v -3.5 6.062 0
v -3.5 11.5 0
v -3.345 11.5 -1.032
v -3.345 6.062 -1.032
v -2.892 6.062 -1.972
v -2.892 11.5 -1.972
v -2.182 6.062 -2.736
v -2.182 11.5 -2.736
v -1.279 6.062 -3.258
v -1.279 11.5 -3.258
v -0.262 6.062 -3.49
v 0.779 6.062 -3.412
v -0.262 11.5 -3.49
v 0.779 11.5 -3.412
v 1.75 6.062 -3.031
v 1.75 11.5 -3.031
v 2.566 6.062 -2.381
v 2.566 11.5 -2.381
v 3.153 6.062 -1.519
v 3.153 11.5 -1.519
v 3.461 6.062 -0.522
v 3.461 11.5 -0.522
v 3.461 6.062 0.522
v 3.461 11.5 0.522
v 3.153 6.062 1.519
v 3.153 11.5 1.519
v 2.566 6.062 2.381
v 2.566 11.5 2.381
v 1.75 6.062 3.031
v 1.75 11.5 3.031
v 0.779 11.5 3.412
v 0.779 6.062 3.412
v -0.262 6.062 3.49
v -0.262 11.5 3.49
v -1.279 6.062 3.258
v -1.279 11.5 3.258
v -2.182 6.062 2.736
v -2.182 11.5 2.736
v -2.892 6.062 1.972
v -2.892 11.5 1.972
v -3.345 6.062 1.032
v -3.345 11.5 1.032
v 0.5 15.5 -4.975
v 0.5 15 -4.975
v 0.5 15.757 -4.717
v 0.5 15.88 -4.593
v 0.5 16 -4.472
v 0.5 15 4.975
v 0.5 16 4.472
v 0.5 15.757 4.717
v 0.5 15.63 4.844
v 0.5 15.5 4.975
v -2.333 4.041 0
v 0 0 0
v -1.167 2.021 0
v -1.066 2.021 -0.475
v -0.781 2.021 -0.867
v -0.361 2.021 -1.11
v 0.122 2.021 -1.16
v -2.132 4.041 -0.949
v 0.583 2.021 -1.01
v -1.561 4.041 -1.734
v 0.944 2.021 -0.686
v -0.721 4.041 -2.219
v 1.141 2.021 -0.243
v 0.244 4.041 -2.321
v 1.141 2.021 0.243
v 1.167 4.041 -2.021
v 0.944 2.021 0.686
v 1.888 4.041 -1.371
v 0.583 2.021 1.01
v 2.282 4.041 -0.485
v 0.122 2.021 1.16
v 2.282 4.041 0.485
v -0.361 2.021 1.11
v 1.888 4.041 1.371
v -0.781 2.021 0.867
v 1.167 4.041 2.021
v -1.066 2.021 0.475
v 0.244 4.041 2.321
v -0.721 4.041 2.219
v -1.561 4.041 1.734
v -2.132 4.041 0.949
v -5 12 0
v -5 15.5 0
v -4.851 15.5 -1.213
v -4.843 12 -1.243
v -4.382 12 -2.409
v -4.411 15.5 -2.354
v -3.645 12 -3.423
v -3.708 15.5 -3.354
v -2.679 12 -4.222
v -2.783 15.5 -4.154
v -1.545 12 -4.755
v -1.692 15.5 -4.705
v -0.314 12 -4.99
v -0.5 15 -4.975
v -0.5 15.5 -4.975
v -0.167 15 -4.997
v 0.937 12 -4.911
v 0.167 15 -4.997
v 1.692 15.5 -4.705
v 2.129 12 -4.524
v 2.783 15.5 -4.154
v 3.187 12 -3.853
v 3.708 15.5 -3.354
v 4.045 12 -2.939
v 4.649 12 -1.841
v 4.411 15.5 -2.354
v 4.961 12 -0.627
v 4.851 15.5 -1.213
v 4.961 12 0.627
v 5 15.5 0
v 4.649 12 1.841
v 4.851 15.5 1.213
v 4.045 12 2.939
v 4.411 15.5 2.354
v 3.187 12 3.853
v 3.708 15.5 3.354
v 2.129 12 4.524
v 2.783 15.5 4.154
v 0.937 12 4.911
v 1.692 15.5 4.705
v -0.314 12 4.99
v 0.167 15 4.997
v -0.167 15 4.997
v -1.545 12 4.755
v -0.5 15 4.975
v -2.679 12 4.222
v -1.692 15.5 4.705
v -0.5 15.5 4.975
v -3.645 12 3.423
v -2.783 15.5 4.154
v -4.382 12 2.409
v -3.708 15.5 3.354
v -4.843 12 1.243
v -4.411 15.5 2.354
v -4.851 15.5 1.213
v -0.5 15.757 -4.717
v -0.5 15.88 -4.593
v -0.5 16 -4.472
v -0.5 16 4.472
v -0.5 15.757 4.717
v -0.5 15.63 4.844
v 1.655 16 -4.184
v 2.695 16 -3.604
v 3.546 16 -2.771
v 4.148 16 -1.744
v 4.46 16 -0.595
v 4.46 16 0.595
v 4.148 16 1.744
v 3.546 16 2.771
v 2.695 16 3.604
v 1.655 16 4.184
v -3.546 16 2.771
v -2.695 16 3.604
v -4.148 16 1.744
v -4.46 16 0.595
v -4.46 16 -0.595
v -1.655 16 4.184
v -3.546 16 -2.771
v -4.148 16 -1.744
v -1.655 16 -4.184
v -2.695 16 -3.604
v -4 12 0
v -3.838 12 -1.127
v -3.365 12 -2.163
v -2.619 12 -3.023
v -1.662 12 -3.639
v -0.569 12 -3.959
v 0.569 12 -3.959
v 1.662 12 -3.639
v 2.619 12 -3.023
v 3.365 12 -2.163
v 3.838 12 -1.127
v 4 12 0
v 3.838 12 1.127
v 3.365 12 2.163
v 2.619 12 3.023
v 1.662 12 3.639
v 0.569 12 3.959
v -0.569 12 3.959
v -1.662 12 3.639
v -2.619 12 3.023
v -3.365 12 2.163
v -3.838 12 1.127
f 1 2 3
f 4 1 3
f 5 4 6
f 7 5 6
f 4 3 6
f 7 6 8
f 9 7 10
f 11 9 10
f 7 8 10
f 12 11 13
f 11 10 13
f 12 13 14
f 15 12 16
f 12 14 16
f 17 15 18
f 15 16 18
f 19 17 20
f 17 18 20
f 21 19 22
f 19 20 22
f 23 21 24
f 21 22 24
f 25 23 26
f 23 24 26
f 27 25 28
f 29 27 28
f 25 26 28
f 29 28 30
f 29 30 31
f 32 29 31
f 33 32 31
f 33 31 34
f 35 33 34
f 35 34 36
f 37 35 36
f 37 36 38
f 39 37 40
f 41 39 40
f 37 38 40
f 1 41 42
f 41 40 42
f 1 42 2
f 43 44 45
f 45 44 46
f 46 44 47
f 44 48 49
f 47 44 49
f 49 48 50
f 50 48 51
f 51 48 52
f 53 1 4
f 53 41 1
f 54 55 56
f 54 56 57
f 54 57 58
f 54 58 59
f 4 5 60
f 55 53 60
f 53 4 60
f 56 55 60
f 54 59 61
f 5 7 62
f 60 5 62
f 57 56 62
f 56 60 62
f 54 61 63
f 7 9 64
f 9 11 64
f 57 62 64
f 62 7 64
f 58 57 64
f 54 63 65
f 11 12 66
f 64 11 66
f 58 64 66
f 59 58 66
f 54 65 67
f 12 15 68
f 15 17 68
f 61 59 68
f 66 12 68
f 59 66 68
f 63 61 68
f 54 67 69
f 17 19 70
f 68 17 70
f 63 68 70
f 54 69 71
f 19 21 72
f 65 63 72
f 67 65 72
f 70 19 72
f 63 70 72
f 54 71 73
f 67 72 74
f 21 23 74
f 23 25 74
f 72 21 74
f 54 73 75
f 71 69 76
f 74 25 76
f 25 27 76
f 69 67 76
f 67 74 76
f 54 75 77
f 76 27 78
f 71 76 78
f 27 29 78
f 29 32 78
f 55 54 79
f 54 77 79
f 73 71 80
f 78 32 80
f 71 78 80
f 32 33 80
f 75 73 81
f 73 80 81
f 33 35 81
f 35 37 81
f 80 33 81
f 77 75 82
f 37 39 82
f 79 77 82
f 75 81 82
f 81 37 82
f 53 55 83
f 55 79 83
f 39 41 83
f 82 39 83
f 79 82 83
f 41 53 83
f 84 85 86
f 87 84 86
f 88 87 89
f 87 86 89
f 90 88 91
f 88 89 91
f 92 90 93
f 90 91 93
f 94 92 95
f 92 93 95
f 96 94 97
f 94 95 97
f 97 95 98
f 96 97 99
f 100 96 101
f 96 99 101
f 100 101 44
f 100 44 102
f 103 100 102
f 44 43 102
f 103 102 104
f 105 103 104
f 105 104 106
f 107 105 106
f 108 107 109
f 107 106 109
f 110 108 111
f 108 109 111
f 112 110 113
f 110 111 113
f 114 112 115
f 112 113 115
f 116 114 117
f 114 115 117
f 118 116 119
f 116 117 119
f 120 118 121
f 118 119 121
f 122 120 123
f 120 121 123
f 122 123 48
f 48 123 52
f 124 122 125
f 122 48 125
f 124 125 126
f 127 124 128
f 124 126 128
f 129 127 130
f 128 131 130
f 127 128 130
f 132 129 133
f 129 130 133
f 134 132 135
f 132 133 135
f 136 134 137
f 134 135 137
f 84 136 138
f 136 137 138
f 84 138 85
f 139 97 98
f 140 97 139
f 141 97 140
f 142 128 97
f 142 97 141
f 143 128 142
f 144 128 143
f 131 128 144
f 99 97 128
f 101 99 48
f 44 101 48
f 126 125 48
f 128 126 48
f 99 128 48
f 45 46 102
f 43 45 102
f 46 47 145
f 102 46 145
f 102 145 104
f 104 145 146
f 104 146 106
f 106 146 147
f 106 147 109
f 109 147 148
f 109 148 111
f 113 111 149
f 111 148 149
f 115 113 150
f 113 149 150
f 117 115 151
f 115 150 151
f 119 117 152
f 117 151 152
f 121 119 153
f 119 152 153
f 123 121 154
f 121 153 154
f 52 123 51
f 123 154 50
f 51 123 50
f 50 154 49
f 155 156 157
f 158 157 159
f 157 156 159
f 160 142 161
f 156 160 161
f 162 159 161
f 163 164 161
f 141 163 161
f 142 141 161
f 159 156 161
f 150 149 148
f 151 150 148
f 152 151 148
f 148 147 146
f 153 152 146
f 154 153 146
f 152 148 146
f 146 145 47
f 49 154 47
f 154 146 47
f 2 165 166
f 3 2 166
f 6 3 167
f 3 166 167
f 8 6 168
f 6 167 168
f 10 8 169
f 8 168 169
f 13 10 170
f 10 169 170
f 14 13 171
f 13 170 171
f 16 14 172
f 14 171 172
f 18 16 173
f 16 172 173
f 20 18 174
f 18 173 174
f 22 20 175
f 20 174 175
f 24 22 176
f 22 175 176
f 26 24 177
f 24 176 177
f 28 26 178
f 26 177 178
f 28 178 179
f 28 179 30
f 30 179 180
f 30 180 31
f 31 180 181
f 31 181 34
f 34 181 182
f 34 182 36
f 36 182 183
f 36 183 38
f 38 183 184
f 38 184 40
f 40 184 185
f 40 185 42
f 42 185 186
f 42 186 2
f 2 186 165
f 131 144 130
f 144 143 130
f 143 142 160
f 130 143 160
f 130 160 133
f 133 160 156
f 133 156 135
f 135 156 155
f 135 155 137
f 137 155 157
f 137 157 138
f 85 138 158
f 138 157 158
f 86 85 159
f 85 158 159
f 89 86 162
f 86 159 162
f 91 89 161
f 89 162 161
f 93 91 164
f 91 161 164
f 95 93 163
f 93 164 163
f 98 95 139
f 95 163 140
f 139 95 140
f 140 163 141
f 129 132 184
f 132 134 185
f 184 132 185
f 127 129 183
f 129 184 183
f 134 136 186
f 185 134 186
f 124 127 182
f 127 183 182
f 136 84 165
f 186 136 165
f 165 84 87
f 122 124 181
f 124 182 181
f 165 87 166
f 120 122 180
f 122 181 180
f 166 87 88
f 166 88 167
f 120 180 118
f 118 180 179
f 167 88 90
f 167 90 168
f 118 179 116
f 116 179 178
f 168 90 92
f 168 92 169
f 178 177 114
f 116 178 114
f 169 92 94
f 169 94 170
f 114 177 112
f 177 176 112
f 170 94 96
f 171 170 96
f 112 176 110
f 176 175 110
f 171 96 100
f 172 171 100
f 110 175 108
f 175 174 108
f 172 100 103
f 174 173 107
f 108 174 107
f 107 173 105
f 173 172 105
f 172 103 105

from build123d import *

# Parameters (mm, degrees)
CHAMFER1_SIZE      = 0.5
SKETCH2_W          = 1
SKETCH2_H          = 2
CUT_EXTRUDE1_DEPTH = 5


with BuildPart() as part:
    # Sketch1 → Revolve1 (revolve)
    with BuildSketch(Plane.XY, mode=Mode.PRIVATE) as revolve1_sk:
        Polygon((0, 0), (3.5, 6.062177826), (3.5, 12), (5, 12), (5, 16), (0, 16), align=None)
    revolve(revolve1_sk.sketch.rotate(Axis((0, 16, 0), (0, -1, 0)), 180), axis=Axis((0, 16, 0), (0, -1, 0)))

    # Chamfer1
    chamfer1_edges = [part.edges().sort_by_distance(p)[0] for p in [
        (5, 16, 0),
        (3.5, 12, 0),
    ]]
    chamfer(chamfer1_edges, length=CHAMFER1_SIZE)

    # Sketch2 → Cut-Extrude1 (cut, symmetric)
    with BuildSketch(Plane.XY):
        with Locations((0, 16)):
            Rectangle(SKETCH2_W, SKETCH2_H)
    extrude(amount=CUT_EXTRUDE1_DEPTH, both=True, mode=Mode.SUBTRACT)


solid = part.part
